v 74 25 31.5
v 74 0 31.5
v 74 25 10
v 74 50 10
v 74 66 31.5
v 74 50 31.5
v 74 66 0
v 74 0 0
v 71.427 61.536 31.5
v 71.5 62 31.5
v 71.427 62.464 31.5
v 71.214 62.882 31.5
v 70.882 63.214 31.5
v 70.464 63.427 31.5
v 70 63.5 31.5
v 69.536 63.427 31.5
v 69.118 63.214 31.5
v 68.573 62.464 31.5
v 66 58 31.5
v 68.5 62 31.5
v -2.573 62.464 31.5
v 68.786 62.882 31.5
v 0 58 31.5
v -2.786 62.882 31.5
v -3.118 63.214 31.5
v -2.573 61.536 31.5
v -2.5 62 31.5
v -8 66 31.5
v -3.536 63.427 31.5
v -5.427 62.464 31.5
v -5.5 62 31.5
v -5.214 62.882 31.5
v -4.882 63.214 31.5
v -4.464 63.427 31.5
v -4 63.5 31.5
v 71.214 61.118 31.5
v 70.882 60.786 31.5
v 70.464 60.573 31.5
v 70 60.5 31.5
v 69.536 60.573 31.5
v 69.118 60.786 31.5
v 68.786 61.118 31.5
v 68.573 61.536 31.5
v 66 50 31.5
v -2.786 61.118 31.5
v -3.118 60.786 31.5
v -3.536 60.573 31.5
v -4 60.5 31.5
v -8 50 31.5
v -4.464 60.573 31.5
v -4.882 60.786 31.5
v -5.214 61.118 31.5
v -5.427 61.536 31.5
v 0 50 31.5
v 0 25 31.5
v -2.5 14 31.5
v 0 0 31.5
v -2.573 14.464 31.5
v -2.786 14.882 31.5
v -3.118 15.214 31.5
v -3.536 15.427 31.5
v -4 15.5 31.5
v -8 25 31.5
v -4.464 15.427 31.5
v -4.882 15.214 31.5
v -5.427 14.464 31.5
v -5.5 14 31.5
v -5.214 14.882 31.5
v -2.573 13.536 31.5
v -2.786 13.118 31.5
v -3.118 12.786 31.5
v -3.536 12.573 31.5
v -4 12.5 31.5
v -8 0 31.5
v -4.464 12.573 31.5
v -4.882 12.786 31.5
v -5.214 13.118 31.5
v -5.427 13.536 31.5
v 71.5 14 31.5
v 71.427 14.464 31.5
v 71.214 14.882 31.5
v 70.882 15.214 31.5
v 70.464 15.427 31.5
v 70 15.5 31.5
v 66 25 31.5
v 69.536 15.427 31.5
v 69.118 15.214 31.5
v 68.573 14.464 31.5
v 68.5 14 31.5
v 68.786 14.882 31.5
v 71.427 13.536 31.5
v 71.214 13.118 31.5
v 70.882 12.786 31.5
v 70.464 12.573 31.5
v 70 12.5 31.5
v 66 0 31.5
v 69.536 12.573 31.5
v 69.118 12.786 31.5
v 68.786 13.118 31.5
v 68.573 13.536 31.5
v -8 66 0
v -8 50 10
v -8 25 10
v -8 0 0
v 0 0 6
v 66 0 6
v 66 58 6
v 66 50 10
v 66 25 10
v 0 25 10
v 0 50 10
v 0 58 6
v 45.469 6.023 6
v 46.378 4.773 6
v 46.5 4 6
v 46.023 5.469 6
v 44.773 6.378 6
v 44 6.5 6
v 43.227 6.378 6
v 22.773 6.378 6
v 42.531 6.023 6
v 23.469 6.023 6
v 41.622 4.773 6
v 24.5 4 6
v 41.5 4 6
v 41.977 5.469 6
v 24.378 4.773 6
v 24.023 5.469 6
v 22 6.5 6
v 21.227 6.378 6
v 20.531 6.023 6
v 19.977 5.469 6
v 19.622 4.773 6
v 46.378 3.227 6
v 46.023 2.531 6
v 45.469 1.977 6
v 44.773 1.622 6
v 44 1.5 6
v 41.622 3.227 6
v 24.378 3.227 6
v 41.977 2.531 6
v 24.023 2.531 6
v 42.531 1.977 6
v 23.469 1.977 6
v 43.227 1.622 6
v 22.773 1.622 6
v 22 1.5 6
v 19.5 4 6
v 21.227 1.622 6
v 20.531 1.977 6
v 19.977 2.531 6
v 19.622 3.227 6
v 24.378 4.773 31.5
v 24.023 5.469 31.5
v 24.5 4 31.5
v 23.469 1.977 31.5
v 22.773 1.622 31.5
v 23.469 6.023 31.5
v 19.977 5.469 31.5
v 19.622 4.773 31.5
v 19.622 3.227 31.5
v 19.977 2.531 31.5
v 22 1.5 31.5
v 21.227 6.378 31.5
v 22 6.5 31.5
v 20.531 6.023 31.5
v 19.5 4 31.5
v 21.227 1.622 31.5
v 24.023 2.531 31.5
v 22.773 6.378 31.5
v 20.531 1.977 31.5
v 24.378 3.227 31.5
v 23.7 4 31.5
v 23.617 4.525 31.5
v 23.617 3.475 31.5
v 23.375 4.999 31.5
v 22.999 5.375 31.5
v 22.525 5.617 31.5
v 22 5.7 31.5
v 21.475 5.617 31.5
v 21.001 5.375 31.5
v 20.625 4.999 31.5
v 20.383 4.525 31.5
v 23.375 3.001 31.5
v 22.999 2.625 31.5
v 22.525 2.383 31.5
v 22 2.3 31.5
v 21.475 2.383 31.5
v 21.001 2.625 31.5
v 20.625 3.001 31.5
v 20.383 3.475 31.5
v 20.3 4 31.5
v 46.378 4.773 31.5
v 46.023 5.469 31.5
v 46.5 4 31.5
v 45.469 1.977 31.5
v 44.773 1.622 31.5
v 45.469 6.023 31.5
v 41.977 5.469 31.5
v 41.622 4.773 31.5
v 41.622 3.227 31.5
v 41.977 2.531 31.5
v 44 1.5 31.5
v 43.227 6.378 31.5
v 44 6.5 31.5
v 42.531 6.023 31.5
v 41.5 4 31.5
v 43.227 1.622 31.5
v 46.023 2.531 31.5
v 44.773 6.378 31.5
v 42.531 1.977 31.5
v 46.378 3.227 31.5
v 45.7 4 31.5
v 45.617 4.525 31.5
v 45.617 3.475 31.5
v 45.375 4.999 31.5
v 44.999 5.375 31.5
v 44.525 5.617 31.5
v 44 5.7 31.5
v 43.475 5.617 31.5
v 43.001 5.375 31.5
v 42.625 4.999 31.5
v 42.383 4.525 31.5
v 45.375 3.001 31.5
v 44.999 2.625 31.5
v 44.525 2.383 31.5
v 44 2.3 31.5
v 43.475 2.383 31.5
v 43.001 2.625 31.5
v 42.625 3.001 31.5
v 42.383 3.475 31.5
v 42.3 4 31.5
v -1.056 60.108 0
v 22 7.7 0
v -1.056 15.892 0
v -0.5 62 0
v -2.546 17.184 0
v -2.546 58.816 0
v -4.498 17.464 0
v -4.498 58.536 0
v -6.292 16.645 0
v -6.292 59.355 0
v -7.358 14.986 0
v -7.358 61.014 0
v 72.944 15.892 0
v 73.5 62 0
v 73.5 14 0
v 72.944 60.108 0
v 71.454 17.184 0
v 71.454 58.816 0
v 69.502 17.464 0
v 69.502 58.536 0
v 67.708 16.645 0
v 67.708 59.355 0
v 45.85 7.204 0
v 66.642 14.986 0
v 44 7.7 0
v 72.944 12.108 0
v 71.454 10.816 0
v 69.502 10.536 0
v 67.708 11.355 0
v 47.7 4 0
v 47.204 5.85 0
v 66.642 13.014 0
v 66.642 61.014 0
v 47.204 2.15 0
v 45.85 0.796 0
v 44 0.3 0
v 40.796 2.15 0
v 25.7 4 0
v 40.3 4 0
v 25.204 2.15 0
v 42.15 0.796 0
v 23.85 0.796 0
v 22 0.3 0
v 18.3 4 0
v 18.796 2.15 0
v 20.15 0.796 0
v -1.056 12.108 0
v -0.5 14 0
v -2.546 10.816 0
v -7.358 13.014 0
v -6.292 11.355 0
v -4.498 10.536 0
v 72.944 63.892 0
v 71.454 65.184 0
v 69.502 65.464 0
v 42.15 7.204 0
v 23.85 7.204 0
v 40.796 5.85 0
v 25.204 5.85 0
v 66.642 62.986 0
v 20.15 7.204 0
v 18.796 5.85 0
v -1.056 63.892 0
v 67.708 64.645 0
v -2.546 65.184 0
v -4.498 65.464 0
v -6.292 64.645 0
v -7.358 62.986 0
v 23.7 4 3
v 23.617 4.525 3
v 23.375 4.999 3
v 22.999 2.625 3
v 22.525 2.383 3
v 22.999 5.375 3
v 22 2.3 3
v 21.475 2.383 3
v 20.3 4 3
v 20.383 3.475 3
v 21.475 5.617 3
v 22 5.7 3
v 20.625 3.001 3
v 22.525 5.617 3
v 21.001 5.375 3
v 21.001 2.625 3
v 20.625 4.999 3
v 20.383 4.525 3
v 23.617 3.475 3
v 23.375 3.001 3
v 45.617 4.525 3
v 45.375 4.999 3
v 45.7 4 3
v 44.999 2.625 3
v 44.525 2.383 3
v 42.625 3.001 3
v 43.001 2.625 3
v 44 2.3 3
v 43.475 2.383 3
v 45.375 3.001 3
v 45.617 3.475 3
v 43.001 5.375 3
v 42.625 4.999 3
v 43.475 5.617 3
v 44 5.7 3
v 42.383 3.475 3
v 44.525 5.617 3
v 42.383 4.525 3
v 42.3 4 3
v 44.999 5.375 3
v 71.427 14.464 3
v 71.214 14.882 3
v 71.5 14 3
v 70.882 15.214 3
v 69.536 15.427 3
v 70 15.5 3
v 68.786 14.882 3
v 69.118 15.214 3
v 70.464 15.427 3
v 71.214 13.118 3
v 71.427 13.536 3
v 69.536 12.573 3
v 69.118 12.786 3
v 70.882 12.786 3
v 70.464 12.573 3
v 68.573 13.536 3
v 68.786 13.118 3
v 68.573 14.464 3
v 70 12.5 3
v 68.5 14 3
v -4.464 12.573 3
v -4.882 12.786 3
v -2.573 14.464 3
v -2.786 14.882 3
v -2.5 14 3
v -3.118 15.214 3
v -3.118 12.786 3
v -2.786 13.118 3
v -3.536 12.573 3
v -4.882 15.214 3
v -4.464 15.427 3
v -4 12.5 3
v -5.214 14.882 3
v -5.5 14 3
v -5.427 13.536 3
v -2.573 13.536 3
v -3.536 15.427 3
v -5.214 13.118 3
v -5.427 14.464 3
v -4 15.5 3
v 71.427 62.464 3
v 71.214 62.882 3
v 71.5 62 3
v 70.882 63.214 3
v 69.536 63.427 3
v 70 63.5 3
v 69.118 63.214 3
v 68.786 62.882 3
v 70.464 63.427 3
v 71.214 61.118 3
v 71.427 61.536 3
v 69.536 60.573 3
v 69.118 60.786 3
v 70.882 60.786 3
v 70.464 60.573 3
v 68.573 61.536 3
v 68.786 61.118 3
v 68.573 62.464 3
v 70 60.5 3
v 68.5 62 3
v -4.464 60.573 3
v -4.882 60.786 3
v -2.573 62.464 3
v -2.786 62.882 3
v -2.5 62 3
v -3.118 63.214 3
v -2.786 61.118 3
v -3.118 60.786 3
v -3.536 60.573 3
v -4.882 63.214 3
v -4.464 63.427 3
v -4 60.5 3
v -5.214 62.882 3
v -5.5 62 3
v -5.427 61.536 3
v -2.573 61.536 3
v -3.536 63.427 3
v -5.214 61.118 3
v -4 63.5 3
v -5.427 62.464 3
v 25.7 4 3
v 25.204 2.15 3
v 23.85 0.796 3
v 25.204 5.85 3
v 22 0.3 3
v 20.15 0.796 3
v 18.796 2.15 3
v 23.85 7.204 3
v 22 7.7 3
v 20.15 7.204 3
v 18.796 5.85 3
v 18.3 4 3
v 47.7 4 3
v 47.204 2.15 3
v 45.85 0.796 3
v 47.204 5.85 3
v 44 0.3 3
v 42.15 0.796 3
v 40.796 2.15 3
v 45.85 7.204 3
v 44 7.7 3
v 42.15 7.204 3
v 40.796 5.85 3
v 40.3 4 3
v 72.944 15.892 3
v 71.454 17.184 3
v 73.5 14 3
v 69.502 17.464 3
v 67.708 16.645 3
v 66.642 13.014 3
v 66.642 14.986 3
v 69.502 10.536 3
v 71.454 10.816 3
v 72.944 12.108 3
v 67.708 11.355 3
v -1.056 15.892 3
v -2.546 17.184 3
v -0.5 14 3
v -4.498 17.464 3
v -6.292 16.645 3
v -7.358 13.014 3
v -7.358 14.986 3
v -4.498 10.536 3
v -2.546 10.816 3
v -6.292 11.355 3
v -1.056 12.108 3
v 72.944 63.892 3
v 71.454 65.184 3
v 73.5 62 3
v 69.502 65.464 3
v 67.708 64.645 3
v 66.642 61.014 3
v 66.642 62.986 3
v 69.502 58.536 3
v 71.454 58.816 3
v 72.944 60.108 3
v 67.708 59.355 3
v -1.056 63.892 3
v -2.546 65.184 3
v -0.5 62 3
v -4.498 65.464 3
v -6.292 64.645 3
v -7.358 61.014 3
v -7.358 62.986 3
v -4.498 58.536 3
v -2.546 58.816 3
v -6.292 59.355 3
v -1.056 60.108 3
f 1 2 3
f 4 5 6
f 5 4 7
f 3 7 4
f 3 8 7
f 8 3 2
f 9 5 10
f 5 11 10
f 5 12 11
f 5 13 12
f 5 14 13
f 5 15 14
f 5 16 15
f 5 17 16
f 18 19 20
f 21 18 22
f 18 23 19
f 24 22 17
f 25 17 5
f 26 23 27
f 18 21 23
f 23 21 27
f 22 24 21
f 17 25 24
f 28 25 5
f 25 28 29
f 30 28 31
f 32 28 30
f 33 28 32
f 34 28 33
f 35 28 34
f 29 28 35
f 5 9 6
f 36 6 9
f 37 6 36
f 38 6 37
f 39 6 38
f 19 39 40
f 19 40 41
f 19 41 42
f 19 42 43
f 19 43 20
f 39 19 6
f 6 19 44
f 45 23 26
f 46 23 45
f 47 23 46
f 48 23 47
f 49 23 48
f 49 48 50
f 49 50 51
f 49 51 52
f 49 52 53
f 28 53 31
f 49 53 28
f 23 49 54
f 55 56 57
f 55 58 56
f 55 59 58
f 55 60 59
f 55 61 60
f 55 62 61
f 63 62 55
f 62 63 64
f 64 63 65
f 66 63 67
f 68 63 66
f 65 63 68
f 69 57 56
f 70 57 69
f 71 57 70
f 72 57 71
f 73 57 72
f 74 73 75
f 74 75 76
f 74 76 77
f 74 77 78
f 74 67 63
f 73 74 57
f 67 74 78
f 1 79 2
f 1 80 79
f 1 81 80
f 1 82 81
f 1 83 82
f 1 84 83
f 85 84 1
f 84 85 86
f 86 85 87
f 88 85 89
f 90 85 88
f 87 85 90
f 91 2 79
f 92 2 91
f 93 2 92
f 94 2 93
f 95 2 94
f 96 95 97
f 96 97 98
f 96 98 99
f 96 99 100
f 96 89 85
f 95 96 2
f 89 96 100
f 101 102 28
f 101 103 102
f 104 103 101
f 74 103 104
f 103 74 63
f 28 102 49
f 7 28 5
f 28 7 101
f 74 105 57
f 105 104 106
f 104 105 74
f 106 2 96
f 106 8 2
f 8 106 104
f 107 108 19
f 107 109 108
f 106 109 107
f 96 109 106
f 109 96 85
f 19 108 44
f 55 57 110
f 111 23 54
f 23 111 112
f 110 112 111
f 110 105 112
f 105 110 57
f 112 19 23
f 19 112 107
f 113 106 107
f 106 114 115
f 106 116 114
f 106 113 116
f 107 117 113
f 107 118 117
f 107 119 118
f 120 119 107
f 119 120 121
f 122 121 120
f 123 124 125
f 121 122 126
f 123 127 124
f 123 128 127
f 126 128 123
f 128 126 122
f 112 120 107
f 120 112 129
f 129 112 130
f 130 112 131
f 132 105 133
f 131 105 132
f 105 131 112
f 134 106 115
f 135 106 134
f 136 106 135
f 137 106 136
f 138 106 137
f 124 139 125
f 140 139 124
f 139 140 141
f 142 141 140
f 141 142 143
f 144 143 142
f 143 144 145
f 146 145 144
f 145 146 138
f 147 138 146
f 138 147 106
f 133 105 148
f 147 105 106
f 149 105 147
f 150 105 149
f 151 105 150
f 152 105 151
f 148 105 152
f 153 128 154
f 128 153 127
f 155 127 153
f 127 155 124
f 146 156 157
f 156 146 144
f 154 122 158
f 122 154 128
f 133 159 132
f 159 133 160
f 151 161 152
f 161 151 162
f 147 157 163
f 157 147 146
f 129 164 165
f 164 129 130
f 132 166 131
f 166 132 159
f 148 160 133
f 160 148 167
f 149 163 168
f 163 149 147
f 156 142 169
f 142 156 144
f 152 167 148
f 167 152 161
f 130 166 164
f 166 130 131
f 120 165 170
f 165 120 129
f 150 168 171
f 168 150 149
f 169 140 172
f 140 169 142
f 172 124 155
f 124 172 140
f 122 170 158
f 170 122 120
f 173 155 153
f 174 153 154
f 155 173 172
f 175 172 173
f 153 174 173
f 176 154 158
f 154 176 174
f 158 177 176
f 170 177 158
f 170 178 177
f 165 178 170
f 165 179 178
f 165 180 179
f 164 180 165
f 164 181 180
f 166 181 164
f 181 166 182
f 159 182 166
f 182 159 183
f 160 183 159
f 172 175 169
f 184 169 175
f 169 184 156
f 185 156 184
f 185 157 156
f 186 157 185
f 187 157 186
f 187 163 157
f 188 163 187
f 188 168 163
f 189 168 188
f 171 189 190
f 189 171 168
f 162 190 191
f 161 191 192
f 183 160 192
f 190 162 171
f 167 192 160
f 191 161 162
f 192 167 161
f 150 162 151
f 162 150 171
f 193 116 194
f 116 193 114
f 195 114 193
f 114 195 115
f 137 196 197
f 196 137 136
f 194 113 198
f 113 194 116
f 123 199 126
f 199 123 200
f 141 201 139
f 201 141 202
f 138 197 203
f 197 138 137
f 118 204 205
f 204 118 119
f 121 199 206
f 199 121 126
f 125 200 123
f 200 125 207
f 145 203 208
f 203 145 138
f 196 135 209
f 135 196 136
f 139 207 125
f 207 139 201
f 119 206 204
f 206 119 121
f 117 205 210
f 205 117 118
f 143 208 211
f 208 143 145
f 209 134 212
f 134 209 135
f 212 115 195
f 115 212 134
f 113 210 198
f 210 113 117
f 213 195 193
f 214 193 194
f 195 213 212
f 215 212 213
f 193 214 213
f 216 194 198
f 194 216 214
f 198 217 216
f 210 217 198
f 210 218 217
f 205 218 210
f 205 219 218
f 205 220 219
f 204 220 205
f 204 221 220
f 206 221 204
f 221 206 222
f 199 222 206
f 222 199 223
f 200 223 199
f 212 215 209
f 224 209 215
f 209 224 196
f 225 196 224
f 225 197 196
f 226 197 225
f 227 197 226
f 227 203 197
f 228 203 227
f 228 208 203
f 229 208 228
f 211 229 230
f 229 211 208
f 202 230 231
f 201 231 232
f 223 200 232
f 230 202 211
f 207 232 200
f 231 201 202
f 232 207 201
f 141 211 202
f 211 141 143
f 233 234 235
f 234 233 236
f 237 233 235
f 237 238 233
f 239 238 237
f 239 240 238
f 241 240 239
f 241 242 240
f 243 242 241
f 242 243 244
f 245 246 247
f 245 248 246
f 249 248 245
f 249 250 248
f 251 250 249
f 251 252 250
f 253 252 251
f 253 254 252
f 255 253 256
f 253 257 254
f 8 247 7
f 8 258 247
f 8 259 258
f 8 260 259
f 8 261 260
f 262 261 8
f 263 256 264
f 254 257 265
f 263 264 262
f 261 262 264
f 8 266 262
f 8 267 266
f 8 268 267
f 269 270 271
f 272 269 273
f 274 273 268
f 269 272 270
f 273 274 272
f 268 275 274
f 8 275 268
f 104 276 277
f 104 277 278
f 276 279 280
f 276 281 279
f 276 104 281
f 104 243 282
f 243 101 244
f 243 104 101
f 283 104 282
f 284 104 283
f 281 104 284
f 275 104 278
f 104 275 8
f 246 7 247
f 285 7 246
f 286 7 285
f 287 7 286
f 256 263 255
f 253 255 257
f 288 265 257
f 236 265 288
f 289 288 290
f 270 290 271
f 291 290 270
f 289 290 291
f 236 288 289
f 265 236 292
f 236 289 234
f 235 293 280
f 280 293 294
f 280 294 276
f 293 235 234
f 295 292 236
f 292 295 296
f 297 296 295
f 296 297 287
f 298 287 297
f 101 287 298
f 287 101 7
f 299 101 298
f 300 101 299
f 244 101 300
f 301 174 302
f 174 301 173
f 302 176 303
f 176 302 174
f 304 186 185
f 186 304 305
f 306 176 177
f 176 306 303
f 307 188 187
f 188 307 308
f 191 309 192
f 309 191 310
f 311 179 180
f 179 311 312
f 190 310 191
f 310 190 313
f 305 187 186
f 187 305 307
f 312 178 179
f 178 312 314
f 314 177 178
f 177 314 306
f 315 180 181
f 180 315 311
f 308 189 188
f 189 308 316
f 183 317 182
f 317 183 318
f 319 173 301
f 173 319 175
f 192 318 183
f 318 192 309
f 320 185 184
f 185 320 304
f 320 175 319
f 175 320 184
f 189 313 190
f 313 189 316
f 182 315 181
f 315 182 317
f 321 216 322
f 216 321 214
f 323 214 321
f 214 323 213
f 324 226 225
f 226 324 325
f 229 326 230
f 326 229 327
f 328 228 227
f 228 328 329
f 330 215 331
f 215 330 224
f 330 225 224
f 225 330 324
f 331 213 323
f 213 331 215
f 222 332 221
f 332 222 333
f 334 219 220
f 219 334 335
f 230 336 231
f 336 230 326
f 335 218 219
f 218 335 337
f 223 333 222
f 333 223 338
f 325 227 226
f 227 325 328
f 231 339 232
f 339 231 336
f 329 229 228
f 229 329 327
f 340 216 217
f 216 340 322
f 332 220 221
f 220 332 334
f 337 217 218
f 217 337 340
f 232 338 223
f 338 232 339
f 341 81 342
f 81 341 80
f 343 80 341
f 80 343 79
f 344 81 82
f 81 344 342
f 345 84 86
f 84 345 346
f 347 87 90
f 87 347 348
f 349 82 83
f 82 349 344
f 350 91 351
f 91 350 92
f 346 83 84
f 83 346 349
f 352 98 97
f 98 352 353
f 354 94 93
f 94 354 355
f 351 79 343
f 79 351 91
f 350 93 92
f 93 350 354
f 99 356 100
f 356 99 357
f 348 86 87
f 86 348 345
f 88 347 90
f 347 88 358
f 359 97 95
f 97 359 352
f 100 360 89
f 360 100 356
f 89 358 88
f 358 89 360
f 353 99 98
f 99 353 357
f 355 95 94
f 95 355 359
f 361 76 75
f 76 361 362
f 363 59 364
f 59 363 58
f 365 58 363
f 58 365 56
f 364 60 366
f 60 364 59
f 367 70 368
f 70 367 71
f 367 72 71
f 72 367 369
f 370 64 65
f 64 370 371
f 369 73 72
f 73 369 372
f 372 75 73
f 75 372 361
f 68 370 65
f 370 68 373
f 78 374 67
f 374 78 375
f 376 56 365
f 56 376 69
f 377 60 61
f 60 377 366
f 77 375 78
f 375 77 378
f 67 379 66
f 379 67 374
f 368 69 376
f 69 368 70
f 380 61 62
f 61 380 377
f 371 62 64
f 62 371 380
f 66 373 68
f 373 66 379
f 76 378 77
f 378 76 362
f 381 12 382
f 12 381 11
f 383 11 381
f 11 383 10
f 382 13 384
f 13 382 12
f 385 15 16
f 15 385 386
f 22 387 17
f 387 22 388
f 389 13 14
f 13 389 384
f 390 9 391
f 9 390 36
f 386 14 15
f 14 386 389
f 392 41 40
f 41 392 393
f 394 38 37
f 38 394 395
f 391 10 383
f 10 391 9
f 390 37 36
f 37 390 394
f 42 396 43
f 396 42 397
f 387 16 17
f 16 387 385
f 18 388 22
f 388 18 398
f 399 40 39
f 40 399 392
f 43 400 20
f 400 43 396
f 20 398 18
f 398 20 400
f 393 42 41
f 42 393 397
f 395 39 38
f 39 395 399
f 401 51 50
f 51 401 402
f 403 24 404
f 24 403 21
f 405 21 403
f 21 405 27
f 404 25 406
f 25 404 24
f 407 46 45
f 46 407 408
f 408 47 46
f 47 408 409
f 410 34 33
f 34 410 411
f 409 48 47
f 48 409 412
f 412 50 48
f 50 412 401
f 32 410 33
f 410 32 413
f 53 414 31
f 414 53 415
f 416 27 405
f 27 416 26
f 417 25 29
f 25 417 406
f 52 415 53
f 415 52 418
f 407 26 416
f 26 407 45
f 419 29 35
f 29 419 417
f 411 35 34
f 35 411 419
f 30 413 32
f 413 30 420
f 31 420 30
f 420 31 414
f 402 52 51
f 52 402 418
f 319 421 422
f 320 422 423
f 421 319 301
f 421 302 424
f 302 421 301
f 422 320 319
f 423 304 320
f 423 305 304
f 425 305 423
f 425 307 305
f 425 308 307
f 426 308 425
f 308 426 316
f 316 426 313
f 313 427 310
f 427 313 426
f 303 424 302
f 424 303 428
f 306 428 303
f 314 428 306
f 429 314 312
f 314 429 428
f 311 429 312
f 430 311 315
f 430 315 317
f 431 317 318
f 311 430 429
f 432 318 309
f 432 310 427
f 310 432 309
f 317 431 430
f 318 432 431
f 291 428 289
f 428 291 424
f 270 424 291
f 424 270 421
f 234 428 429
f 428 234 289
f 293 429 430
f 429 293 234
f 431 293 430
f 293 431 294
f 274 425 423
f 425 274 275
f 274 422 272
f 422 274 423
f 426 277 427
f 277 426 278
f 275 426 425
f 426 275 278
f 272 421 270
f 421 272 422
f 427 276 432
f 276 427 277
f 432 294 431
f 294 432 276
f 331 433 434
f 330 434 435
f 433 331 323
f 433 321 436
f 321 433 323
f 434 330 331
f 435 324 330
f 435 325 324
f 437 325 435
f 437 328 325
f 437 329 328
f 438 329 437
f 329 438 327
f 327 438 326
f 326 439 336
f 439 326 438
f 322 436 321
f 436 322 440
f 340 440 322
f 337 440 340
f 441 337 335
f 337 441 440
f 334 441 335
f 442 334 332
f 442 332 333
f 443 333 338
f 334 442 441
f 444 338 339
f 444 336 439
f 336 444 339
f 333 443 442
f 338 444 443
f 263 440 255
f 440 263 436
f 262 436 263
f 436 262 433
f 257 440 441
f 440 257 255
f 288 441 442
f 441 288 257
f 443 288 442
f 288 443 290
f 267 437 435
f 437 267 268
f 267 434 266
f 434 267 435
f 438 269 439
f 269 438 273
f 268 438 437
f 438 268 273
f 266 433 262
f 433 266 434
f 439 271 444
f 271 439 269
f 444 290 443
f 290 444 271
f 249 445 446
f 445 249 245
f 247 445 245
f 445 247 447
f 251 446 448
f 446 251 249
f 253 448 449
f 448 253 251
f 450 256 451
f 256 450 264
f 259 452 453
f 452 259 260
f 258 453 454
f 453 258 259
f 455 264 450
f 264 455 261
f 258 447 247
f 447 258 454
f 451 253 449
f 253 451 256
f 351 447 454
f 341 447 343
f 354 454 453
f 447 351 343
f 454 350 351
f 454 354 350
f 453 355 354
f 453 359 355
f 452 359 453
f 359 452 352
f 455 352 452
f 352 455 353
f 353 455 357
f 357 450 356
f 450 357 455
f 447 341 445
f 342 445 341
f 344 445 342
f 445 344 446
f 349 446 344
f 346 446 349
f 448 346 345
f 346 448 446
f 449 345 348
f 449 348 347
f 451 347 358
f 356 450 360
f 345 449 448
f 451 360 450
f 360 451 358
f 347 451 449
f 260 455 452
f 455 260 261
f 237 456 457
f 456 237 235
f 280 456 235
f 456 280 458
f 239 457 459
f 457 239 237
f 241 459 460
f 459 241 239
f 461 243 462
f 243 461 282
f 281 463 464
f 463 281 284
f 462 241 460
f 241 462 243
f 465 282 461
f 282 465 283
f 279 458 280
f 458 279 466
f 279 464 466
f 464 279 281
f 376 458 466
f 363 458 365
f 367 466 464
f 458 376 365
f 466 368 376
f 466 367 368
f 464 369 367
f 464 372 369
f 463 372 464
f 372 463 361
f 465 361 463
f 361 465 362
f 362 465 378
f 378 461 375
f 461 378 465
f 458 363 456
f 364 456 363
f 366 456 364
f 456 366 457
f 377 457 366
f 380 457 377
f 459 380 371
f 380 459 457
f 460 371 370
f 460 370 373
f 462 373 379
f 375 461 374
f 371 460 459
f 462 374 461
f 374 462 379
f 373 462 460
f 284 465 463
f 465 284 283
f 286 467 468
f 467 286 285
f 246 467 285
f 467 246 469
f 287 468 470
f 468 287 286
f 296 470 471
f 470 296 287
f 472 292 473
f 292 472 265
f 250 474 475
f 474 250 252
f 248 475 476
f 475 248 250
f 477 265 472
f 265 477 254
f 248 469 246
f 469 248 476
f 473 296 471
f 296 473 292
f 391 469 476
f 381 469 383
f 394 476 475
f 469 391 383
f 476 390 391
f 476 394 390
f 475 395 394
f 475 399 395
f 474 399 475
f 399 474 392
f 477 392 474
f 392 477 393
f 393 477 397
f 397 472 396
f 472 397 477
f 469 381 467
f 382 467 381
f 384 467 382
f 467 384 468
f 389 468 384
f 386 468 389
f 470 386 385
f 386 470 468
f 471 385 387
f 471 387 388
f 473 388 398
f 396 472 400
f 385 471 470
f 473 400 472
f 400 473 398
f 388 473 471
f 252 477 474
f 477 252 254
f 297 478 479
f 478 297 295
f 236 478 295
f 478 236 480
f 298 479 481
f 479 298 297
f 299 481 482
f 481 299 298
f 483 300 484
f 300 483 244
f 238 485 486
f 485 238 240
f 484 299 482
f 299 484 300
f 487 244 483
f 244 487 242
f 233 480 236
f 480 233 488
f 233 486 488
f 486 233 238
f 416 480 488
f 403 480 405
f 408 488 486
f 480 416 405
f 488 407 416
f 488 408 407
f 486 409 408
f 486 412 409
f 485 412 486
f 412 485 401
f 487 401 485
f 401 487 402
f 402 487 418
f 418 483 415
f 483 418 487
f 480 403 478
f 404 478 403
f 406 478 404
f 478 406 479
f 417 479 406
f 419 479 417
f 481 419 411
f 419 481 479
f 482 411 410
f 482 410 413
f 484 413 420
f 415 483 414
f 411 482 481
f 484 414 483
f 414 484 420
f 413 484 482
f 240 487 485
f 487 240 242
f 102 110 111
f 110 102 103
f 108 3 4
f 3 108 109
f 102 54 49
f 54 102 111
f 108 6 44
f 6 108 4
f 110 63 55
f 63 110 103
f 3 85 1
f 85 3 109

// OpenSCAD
module holder(){
	wallWidth = 8;
	translate([0,0,4]){
		cube([66, 58, 2]);

		translate([22, 4, 2]){
			cylinder(25.5, 5/2, 5/2);
		}

		translate([22+22, 4, 2]){
			cylinder(25.5, 5/2, 5/2);
		}


		difference(){
			translate([-wallWidth, 0, 0]){
				cube([66+2*wallWidth, 58+wallWidth, 25.5+2]);
			}
			cube([66, 58, 25.6+2]);
		}
	}
	translate([-wallWidth, 0, 0]){
		cube([66+2*wallWidth, 58+wallWidth, 4]);
	}
}

module drillHoles(r, dep){
	translate([22, 4,0]){
		cylinder(dep, r+0.2, r+0.2);
	}	

	translate([44, 4,0]){
		cylinder(dep, r+0.2, r+0.2);
	}
	
	translate([70, 14,0]){
		cylinder(dep, r, r);
	}

	translate([-4, 14,0]){
		cylinder(dep, r, r);
	}

	translate([70, 62,0]){
		cylinder(dep, r, r);
	}

	translate([-4, 62,0]){
		cylinder(dep, r, r);
	}	
}

difference(){
	holder($fn=20);
	drillHoles(3/2, 70, $fn=20);	
	drillHoles(7/2, 3);
	translate([-10, 25, 10]){
	cube([100, 25, 25]);
}
}
